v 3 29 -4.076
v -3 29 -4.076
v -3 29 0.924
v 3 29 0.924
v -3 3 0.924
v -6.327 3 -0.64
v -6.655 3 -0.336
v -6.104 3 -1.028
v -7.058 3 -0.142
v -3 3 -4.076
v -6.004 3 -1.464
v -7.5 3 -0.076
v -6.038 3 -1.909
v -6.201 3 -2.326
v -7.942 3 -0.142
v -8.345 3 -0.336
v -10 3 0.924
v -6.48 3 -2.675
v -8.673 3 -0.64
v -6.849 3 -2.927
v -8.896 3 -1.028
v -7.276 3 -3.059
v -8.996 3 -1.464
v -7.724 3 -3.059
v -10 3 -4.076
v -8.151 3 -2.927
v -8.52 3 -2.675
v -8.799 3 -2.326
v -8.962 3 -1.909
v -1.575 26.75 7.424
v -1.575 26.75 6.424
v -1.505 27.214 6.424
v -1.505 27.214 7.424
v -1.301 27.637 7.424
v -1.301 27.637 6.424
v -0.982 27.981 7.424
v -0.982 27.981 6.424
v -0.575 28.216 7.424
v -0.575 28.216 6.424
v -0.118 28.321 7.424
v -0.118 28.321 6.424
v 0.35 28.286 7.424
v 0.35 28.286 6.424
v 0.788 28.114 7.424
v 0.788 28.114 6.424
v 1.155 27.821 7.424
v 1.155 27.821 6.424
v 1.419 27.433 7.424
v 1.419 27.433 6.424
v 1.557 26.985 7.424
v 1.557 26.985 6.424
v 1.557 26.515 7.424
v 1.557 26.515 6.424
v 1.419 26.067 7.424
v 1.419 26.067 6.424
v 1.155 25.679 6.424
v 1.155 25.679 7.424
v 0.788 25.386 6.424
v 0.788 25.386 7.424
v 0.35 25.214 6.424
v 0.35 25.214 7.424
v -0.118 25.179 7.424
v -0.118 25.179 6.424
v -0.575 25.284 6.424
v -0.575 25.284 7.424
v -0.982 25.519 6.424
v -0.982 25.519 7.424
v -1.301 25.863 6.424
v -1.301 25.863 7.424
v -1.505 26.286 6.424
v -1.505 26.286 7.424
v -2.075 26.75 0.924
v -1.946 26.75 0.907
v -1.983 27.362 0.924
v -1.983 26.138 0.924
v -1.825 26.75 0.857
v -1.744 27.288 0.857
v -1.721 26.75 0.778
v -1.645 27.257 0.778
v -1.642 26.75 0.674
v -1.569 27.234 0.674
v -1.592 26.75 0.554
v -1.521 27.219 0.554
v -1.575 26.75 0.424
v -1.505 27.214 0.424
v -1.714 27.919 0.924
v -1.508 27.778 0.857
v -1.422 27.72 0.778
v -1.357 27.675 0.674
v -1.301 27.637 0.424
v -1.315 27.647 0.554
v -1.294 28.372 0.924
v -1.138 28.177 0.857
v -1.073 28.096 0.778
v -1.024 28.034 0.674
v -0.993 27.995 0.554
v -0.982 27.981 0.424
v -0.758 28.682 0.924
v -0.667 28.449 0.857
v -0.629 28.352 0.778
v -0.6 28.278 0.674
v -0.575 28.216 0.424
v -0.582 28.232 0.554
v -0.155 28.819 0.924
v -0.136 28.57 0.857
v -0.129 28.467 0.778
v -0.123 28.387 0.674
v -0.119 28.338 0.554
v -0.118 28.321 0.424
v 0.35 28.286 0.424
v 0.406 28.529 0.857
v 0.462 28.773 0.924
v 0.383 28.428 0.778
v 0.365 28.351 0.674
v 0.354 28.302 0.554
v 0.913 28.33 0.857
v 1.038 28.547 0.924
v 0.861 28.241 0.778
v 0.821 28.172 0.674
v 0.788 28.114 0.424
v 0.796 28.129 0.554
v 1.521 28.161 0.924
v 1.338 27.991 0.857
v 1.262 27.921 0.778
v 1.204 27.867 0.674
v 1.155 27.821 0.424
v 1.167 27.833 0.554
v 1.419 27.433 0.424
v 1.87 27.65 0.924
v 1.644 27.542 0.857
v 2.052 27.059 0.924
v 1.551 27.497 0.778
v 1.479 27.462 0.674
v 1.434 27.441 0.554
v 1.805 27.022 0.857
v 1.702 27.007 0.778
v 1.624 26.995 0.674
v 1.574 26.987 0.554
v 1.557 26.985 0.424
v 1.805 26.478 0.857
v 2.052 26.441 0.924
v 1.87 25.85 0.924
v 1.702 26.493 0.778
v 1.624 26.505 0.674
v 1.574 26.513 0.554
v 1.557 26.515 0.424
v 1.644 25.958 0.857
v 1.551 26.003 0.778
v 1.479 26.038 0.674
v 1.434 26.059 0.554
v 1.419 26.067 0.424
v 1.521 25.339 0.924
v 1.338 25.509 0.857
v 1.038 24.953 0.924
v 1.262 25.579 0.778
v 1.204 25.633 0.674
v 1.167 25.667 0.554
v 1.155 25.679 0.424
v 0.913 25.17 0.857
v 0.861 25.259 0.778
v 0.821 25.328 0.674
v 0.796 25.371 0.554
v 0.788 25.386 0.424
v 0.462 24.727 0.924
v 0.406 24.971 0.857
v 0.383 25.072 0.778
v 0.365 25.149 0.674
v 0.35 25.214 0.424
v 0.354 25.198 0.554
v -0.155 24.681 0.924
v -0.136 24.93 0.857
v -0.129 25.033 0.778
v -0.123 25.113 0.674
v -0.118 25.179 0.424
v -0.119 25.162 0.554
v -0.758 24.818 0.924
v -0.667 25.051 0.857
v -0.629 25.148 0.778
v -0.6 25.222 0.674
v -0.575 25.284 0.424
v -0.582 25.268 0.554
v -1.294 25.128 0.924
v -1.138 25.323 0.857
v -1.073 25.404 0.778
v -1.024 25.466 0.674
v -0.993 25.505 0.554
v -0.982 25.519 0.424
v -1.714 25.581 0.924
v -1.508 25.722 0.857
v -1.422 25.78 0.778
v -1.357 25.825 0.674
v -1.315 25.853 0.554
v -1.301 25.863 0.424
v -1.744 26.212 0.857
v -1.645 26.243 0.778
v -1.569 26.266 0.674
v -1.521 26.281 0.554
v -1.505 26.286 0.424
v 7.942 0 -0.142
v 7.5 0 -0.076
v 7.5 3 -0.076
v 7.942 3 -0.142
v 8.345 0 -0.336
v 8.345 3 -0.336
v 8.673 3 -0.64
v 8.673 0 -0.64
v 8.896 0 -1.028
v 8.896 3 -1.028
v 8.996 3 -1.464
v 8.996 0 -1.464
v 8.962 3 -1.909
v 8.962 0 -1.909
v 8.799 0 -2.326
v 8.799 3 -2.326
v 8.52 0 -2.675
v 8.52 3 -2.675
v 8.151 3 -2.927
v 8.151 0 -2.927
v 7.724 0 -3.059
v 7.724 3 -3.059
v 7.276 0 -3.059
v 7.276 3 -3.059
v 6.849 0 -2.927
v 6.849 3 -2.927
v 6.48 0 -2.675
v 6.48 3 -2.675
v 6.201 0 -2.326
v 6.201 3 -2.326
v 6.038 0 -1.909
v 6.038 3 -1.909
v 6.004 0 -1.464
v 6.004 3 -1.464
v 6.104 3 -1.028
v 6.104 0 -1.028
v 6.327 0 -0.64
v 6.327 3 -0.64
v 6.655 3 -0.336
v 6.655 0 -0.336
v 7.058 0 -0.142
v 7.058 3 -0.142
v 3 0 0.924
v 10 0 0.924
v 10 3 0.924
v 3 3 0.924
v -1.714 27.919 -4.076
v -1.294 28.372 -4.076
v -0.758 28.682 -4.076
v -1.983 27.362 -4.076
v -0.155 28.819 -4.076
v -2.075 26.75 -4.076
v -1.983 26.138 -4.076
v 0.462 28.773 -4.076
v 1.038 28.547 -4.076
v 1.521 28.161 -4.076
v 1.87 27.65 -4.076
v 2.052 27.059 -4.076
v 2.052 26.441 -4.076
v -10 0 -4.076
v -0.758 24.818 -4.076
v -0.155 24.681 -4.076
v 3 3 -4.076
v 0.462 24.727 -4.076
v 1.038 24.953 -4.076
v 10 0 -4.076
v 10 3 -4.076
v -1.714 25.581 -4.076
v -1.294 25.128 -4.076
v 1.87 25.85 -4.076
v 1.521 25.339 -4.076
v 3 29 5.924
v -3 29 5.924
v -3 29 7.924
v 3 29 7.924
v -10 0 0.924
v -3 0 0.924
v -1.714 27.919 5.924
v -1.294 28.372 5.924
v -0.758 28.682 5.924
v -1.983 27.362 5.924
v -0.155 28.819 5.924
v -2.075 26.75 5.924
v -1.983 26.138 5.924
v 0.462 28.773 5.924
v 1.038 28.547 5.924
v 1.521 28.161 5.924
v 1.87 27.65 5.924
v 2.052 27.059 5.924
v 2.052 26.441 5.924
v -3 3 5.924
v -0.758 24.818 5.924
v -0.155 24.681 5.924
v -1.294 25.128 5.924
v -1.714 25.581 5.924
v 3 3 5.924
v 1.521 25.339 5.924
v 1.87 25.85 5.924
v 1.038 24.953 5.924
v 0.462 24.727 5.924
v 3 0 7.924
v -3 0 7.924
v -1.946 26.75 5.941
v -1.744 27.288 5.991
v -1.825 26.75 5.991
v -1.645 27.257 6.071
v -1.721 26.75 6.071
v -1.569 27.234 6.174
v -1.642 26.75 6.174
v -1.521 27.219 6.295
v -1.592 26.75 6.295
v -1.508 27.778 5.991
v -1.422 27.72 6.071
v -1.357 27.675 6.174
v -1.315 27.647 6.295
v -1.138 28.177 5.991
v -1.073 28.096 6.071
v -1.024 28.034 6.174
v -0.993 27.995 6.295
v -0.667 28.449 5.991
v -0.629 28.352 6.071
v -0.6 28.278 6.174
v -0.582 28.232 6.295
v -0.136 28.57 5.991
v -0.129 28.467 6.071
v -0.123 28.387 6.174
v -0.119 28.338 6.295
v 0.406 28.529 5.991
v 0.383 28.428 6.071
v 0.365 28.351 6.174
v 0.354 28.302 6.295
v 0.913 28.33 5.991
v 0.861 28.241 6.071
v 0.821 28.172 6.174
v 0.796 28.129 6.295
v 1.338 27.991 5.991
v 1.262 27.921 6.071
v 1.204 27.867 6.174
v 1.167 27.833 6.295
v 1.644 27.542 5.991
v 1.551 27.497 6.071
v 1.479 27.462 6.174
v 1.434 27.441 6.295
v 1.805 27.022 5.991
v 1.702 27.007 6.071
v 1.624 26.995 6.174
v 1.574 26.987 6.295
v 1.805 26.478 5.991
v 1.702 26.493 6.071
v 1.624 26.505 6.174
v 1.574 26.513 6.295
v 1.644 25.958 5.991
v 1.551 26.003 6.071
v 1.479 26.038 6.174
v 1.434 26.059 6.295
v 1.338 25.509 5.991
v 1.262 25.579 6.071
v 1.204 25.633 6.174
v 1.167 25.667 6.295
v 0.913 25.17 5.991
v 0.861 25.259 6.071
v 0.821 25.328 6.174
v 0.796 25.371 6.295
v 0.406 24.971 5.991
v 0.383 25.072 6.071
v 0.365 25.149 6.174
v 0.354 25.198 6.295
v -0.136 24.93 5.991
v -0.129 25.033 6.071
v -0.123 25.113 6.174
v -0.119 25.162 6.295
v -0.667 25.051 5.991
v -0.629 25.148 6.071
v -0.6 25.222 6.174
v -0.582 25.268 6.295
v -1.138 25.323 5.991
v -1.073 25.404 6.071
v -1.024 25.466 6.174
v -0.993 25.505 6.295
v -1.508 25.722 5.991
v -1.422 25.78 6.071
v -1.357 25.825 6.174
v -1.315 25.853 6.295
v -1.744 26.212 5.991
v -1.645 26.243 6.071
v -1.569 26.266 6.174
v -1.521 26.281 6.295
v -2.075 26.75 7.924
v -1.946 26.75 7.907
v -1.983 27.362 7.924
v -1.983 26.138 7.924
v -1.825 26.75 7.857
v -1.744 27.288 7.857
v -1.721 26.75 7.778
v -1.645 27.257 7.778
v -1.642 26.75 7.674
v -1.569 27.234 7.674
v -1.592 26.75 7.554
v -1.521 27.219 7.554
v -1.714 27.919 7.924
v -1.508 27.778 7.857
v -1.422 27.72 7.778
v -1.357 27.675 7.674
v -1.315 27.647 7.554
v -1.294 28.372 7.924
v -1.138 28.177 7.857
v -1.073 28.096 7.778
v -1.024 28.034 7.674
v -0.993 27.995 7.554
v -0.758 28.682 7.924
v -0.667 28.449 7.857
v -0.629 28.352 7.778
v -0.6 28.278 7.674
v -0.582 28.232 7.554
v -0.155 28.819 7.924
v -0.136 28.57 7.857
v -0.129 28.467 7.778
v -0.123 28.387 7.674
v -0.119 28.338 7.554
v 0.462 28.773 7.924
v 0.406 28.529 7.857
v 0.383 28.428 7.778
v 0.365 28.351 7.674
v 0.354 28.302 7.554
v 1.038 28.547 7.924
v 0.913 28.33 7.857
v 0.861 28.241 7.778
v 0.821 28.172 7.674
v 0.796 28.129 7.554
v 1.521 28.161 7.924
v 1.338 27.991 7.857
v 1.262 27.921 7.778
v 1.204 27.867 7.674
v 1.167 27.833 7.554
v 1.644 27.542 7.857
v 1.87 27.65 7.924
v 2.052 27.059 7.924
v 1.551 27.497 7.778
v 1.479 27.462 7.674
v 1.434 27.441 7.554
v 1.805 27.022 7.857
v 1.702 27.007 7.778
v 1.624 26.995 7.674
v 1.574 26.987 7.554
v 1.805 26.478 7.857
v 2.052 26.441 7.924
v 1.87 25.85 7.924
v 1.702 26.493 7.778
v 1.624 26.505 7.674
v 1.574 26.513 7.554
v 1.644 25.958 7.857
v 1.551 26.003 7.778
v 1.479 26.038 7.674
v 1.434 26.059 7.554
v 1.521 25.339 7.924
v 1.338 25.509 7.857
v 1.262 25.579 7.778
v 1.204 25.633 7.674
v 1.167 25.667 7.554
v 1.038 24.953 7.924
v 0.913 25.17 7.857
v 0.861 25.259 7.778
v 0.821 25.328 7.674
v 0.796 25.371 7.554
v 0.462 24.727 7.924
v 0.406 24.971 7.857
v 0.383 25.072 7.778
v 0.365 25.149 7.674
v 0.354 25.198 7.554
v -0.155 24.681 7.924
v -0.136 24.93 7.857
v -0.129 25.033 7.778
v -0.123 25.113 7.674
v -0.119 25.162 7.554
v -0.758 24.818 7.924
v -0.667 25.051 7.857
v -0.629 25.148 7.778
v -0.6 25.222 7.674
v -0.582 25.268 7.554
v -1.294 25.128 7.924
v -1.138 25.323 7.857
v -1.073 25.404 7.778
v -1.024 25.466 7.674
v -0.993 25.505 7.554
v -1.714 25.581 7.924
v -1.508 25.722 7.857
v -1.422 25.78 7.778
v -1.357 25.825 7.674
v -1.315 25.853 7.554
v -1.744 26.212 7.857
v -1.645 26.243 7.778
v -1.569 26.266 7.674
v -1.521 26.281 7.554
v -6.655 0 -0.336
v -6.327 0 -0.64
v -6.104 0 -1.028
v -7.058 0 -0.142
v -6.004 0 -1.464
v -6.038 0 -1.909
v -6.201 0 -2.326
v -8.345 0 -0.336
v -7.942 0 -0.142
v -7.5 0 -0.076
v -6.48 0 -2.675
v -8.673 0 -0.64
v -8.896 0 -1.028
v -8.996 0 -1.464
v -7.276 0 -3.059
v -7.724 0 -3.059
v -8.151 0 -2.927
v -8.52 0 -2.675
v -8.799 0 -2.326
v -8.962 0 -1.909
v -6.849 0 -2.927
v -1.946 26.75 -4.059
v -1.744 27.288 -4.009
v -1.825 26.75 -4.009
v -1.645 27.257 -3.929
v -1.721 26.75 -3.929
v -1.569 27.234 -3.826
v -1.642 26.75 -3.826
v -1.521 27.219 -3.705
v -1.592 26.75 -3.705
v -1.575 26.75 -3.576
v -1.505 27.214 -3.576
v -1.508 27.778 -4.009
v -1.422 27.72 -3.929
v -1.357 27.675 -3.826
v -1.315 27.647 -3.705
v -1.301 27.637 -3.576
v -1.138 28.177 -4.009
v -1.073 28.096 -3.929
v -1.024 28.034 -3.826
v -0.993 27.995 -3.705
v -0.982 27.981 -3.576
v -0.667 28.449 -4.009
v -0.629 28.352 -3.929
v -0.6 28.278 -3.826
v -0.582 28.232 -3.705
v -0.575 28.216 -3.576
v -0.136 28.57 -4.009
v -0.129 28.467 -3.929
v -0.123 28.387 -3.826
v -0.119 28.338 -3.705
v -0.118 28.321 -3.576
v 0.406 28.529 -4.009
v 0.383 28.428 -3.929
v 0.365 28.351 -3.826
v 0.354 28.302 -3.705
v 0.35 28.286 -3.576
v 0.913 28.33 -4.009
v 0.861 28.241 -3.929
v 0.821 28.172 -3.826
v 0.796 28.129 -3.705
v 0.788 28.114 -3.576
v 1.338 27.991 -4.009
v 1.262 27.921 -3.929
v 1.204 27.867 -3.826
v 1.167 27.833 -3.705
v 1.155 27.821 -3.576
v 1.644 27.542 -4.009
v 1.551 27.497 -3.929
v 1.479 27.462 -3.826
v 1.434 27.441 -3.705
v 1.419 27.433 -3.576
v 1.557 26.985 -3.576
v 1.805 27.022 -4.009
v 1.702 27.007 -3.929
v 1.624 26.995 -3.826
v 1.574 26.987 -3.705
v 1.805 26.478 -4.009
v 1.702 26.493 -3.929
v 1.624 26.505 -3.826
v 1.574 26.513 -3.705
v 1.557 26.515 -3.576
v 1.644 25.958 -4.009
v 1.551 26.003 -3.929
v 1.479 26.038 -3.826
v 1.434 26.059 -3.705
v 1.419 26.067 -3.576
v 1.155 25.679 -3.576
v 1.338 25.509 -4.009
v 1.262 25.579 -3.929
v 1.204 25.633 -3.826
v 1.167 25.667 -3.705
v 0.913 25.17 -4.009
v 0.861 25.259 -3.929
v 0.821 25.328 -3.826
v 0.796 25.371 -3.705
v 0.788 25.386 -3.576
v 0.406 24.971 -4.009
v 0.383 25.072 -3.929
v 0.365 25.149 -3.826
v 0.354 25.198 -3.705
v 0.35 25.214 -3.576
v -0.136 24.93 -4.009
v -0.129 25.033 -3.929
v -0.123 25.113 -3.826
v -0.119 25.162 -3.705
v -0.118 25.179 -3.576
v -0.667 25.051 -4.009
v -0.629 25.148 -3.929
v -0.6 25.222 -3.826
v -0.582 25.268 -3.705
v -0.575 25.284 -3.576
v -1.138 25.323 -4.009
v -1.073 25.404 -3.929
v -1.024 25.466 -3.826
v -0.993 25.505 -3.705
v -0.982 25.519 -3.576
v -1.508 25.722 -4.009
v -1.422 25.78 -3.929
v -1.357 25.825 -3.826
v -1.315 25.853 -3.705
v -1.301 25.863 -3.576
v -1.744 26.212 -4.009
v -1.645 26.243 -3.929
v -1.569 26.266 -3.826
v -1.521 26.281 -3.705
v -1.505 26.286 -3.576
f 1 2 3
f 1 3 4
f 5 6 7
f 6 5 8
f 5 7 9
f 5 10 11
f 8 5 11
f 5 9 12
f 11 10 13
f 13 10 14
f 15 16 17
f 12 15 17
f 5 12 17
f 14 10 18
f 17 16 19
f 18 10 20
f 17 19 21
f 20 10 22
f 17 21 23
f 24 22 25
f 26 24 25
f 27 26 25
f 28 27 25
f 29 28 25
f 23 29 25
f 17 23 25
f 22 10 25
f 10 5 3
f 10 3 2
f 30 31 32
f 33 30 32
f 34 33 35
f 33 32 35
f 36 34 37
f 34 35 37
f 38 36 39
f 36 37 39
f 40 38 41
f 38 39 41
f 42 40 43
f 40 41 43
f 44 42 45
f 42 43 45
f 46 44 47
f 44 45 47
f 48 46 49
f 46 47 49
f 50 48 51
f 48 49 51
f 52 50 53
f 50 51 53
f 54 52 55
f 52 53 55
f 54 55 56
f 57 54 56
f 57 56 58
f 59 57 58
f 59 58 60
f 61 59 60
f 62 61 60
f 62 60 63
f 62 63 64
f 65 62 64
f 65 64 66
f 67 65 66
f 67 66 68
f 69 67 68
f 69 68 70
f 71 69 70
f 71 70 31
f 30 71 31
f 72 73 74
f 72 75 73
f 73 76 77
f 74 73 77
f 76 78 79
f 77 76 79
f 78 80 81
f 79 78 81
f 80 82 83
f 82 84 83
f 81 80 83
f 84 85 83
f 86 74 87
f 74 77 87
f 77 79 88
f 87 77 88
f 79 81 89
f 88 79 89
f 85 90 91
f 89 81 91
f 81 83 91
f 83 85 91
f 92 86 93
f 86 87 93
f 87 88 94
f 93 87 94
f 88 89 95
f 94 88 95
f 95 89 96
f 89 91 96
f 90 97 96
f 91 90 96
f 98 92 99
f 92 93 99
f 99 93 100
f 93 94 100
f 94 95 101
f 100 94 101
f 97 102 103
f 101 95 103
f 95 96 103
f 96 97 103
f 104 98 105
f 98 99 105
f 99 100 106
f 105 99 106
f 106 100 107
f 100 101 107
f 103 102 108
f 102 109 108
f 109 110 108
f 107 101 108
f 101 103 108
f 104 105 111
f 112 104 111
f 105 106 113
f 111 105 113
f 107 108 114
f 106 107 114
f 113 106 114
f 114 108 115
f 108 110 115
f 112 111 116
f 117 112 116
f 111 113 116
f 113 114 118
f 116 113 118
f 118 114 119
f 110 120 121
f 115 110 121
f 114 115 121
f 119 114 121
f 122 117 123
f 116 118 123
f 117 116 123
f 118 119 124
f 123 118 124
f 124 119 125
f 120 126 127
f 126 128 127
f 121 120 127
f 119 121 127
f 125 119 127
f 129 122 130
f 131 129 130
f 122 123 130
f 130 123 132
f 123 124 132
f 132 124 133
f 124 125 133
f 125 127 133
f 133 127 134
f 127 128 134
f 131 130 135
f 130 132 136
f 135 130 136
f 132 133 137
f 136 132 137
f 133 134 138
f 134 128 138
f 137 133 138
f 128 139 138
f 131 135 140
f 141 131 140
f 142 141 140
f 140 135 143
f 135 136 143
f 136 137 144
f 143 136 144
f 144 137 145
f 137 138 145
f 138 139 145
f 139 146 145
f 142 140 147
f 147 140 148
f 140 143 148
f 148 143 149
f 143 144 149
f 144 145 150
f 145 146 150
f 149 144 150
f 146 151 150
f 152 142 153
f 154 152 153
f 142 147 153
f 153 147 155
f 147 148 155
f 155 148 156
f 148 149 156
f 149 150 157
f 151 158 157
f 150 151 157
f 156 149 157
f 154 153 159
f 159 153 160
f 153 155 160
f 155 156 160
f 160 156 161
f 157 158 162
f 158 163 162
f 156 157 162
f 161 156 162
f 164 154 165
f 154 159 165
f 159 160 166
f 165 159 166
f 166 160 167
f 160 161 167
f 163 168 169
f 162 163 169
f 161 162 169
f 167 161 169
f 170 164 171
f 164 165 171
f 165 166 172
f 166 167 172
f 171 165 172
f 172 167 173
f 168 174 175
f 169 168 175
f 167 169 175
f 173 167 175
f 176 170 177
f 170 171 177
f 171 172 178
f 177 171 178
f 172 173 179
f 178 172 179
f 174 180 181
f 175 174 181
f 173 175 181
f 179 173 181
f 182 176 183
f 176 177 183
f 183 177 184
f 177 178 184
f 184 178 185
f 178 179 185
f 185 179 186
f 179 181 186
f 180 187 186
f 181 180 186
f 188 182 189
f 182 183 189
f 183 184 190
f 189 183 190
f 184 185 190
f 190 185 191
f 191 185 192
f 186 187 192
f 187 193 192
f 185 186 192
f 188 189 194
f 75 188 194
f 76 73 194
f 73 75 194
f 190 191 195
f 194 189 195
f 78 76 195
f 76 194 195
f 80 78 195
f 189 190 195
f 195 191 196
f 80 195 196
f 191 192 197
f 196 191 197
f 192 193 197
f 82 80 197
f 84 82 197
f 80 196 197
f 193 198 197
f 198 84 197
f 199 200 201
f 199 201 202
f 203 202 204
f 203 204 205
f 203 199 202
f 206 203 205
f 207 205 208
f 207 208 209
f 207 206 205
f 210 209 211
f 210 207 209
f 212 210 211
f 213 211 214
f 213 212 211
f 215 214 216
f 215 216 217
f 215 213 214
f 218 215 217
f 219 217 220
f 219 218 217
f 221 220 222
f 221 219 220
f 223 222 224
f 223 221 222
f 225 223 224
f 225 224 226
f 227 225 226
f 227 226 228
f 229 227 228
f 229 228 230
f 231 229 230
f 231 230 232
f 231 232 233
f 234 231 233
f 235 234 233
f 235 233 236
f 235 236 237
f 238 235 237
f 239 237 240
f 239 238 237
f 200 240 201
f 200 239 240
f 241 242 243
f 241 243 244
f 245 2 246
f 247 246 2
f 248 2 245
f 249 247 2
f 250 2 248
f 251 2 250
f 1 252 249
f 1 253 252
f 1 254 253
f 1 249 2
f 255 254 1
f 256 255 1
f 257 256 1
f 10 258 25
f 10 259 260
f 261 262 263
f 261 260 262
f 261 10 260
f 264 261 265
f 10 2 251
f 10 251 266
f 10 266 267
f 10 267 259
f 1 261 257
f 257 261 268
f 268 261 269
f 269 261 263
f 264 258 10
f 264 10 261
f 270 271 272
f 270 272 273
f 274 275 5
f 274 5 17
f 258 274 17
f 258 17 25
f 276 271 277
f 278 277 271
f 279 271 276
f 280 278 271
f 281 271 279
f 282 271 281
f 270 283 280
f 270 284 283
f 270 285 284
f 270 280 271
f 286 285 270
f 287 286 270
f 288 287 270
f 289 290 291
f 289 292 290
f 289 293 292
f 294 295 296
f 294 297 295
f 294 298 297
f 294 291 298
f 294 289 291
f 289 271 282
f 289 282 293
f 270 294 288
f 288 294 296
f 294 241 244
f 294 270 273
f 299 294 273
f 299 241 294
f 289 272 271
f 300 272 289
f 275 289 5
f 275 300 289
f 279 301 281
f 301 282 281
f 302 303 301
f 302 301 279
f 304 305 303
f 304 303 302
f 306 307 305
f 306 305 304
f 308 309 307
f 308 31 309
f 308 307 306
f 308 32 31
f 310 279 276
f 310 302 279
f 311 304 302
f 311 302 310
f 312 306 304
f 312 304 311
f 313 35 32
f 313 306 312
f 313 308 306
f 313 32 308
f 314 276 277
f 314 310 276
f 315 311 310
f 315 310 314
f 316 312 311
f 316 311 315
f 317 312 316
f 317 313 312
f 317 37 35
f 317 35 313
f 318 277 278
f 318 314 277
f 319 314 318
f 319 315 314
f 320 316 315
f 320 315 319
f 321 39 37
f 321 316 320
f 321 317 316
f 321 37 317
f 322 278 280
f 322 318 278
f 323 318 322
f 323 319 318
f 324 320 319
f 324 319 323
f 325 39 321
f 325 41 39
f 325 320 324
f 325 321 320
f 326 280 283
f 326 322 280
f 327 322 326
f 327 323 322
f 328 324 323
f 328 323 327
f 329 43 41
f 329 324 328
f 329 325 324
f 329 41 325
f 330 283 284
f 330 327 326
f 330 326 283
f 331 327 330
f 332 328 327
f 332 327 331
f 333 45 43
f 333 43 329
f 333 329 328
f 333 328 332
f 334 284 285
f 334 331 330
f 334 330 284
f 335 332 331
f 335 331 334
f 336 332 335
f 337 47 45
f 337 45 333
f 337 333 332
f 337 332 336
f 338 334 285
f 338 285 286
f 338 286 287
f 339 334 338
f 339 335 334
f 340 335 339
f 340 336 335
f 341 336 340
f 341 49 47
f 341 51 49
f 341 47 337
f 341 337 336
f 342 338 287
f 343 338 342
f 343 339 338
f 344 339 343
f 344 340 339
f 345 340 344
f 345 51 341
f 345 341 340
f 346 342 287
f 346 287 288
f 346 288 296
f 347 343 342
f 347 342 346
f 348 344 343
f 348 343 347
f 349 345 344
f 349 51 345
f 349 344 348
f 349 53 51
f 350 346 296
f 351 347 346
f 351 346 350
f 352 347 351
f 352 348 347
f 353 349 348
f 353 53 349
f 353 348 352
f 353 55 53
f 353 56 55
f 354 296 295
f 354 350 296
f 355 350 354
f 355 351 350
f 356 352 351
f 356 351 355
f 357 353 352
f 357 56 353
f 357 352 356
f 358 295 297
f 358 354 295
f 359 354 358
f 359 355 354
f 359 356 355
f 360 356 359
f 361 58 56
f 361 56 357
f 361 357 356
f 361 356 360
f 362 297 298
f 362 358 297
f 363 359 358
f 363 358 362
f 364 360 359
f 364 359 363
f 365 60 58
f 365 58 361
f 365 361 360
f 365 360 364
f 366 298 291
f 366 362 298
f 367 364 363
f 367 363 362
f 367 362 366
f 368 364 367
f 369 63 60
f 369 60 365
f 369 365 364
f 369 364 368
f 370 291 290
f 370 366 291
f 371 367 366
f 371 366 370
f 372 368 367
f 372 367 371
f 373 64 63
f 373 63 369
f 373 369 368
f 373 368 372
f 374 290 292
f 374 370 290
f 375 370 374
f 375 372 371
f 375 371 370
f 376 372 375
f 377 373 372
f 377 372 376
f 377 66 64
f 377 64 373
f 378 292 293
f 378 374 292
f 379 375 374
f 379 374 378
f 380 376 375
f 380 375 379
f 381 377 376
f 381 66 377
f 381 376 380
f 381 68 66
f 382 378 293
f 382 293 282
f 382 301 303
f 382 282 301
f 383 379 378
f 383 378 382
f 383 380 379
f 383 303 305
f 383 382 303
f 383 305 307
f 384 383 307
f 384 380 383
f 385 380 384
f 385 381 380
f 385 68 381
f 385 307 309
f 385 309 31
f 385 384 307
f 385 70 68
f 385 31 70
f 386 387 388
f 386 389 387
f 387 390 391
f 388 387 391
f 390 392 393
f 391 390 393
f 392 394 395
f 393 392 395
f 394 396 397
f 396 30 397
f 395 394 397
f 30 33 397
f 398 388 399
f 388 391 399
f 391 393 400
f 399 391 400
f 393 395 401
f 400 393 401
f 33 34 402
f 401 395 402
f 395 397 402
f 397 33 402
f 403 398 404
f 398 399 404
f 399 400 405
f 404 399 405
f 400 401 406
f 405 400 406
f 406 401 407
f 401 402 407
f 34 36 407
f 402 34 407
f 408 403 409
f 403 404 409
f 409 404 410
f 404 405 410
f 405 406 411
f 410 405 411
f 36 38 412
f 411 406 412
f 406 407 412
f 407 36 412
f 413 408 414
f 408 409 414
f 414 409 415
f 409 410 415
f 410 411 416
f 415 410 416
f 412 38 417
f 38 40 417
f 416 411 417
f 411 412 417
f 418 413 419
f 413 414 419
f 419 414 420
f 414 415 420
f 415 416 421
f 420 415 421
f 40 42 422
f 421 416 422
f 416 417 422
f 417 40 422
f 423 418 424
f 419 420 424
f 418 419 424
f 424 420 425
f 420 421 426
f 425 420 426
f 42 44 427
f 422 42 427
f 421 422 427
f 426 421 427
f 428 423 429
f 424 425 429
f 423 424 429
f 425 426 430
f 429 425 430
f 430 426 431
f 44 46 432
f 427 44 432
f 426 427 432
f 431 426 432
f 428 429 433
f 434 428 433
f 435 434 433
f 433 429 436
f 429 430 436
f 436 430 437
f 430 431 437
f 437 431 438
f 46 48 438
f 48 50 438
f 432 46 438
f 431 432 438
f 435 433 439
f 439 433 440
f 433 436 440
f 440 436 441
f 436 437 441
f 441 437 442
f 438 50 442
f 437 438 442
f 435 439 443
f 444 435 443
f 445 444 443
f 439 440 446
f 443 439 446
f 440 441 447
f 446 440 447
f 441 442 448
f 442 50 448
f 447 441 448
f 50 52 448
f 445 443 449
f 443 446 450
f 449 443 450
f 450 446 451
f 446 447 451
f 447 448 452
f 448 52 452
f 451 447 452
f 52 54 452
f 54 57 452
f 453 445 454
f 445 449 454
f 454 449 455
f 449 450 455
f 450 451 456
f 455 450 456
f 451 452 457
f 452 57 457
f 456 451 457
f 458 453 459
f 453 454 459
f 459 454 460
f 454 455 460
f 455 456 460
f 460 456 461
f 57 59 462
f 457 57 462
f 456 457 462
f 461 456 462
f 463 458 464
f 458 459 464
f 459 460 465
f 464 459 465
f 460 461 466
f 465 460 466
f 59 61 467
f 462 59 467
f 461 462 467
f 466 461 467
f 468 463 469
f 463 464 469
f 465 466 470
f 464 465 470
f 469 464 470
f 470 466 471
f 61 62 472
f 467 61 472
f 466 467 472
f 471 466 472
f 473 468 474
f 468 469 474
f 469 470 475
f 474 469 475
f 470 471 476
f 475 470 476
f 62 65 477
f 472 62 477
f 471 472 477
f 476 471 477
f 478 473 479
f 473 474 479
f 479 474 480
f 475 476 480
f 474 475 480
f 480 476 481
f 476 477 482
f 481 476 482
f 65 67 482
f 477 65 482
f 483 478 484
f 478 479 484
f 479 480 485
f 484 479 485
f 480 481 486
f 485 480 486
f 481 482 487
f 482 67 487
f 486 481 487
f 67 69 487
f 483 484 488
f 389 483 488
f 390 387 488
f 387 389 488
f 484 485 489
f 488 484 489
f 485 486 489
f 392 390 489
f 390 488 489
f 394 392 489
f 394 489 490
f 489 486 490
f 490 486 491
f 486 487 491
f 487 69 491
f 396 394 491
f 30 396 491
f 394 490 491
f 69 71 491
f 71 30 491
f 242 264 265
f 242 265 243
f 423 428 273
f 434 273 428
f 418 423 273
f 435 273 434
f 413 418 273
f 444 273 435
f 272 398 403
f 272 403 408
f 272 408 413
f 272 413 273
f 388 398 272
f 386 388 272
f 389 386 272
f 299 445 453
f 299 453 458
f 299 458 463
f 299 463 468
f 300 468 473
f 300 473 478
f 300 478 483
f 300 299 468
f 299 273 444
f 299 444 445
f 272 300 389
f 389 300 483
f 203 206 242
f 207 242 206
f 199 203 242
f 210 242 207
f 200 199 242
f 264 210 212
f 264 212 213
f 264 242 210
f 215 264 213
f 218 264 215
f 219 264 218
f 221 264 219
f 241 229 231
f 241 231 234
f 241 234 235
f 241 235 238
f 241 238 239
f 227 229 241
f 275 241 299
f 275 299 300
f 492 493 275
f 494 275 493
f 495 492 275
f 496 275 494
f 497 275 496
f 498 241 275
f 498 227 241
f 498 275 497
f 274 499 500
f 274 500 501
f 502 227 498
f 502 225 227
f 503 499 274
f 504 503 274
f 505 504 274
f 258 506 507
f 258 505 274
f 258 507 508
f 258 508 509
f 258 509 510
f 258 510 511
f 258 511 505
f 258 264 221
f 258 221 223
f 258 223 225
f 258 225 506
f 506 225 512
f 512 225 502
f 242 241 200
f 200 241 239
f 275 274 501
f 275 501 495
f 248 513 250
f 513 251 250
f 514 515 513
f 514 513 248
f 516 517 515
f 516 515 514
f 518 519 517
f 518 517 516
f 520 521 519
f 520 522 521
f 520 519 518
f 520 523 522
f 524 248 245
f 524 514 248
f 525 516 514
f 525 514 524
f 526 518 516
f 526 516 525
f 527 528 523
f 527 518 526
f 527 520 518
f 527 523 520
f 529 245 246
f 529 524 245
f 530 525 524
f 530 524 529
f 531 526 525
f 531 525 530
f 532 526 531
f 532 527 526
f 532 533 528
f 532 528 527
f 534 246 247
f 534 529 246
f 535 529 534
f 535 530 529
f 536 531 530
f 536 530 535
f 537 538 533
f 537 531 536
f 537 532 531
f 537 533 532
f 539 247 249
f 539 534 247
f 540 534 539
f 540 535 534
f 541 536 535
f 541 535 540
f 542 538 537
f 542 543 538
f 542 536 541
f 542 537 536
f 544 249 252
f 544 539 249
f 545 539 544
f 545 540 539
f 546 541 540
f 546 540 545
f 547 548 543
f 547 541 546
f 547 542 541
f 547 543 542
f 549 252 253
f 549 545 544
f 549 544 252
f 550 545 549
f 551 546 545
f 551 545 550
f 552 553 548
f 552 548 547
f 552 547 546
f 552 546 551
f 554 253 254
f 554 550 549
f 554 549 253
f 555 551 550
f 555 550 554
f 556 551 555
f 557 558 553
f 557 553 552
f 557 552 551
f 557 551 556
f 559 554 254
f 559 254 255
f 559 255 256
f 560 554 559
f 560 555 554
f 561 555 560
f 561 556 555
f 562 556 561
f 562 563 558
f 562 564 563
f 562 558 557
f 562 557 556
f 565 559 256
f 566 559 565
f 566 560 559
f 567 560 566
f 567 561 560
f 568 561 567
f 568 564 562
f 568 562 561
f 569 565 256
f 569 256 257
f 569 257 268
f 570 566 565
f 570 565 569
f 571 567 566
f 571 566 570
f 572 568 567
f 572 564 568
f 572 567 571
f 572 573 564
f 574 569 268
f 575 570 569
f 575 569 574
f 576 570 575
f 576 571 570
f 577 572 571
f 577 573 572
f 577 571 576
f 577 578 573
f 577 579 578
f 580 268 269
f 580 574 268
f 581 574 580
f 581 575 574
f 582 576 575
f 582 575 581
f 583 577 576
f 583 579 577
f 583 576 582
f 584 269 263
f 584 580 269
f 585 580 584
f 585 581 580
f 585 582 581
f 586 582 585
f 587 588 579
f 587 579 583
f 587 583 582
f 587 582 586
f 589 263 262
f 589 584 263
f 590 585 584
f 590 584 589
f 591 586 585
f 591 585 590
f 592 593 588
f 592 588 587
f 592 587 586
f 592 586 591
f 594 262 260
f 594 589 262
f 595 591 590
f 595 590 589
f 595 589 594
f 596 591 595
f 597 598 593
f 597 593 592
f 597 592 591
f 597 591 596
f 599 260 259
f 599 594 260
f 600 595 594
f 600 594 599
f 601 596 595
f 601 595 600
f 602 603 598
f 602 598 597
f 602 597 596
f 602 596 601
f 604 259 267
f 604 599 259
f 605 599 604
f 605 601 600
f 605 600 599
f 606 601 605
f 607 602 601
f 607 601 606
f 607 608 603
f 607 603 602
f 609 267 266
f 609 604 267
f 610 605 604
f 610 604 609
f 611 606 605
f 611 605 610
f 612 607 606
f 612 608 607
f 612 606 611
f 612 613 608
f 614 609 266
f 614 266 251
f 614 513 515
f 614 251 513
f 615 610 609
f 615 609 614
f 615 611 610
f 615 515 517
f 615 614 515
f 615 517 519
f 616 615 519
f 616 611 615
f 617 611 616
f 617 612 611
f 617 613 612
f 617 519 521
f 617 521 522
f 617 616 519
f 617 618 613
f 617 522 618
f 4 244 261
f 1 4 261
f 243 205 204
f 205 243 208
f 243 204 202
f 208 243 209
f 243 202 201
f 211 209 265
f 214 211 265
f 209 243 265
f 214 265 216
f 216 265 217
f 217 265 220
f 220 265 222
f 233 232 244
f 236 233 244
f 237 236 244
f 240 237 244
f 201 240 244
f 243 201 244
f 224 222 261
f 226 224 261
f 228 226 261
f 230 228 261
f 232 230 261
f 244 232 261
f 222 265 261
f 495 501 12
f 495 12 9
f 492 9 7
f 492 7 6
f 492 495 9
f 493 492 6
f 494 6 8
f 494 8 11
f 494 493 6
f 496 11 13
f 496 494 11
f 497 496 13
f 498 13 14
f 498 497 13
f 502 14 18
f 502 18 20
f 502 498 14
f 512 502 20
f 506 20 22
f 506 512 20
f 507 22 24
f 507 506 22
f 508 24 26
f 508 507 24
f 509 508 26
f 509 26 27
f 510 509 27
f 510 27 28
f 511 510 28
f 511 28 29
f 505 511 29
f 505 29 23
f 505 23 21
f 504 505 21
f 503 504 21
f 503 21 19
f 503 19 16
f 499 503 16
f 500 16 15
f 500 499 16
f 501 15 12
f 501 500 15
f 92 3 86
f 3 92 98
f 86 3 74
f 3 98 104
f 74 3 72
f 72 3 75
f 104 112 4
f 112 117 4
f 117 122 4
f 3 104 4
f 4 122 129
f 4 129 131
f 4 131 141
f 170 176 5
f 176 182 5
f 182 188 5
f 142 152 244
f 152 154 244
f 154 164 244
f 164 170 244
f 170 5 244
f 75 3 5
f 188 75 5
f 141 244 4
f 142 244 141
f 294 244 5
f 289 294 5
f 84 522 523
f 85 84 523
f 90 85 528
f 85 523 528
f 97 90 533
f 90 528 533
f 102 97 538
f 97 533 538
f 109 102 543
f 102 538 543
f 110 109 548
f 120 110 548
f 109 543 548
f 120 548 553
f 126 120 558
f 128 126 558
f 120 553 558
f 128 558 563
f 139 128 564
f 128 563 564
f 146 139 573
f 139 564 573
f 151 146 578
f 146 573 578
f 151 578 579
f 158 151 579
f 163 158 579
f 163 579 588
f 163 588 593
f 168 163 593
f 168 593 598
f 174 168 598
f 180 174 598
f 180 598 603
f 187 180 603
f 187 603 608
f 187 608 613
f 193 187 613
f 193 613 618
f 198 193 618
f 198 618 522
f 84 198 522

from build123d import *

# Parameters (mm, degrees)
SKETCH1_R           = 1.5
BOSS_EXTRUDE1_DEPTH = 3
SKETCH2_W           = 6
SKETCH2_H           = 5
SKETCH2_H_2         = 2
BOSS_EXTRUDE2_DEPTH = 26
CUT_EXTRUDE1_REACH  = 34.939
SKETCH3_R           = 1.575
FILLET1_R           = 0.5


with BuildPart() as part:
    # Sketch1 → Boss-Extrude1 (new body)
    with BuildSketch(Plane(origin=(0, 0, 0), x_dir=(1, 0, 0), z_dir=(0, 1, 0))):
        Polygon((-10, 4.075667656), (10, 4.075667656), (10, -0.924332344), (3, -0.924332344), (3, -7.924332344), (-3, -7.924332344), (-3, -0.924332344), (-10, -0.924332344), align=None)
        with Locations(Location((7.5, 1.575667656, 0), (0, 0, 270))):
            Circle(SKETCH1_R, mode=Mode.SUBTRACT)
        with Locations(Location((-7.5, 1.575667656, 0), (0, 0, 270))):
            Circle(SKETCH1_R, mode=Mode.SUBTRACT)
    extrude(amount=BOSS_EXTRUDE1_DEPTH)

    # Sketch2 → Boss-Extrude2 (add)
    with BuildSketch(Plane(origin=(0, 3, 0), x_dir=(1, 0, 0), z_dir=(0, 1, 0))):
        with Locations((0, 1.575667656)):
            Rectangle(SKETCH2_W, SKETCH2_H)
        with Locations((0, -6.924332344)):
            Rectangle(SKETCH2_W, SKETCH2_H_2)
    extrude(amount=BOSS_EXTRUDE2_DEPTH)

    # Cut-Extrude1: up to this face of the body (flat: up to its plane)
    cut_extrude1_end = Plane(part.part.faces().sort_by_distance((0, 14.5, 7.924332344))[0])
    # Sketch3 → Cut-Extrude1 (cut, up to the picked face)
    with BuildSketch(Plane(origin=(0, 0, -4.075667656), x_dir=(-1, 0, 0), z_dir=(0, 0, -1)), mode=Mode.PRIVATE) as cut_extrude1_sk1:
        with Locations((0, 26.75)):
            Circle(SKETCH3_R)
    cut_extrude1_tool1 = split(extrude(cut_extrude1_sk1.sketch, amount=-CUT_EXTRUDE1_REACH, mode=Mode.PRIVATE), bisect_by=cut_extrude1_end, keep=Keep.BOTH, mode=Mode.PRIVATE)
    add(cut_extrude1_tool1.solids().sort_by(Axis((0, 26.75, -4.075668), (0, 0, 1)))[0], mode=Mode.SUBTRACT)

    # Fillet1
    fillet1_edges = [part.edges().sort_by_distance(p)[0] for p in [
        (1.575, 26.75, 0.924332344),
        (1.575, 26.75, 5.924332344),
        (1.575, 26.75, -4.075667656),
        (1.575, 26.75, 7.924332344),
    ]]
    fillet(fillet1_edges, radius=FILLET1_R)


solid = part.part
